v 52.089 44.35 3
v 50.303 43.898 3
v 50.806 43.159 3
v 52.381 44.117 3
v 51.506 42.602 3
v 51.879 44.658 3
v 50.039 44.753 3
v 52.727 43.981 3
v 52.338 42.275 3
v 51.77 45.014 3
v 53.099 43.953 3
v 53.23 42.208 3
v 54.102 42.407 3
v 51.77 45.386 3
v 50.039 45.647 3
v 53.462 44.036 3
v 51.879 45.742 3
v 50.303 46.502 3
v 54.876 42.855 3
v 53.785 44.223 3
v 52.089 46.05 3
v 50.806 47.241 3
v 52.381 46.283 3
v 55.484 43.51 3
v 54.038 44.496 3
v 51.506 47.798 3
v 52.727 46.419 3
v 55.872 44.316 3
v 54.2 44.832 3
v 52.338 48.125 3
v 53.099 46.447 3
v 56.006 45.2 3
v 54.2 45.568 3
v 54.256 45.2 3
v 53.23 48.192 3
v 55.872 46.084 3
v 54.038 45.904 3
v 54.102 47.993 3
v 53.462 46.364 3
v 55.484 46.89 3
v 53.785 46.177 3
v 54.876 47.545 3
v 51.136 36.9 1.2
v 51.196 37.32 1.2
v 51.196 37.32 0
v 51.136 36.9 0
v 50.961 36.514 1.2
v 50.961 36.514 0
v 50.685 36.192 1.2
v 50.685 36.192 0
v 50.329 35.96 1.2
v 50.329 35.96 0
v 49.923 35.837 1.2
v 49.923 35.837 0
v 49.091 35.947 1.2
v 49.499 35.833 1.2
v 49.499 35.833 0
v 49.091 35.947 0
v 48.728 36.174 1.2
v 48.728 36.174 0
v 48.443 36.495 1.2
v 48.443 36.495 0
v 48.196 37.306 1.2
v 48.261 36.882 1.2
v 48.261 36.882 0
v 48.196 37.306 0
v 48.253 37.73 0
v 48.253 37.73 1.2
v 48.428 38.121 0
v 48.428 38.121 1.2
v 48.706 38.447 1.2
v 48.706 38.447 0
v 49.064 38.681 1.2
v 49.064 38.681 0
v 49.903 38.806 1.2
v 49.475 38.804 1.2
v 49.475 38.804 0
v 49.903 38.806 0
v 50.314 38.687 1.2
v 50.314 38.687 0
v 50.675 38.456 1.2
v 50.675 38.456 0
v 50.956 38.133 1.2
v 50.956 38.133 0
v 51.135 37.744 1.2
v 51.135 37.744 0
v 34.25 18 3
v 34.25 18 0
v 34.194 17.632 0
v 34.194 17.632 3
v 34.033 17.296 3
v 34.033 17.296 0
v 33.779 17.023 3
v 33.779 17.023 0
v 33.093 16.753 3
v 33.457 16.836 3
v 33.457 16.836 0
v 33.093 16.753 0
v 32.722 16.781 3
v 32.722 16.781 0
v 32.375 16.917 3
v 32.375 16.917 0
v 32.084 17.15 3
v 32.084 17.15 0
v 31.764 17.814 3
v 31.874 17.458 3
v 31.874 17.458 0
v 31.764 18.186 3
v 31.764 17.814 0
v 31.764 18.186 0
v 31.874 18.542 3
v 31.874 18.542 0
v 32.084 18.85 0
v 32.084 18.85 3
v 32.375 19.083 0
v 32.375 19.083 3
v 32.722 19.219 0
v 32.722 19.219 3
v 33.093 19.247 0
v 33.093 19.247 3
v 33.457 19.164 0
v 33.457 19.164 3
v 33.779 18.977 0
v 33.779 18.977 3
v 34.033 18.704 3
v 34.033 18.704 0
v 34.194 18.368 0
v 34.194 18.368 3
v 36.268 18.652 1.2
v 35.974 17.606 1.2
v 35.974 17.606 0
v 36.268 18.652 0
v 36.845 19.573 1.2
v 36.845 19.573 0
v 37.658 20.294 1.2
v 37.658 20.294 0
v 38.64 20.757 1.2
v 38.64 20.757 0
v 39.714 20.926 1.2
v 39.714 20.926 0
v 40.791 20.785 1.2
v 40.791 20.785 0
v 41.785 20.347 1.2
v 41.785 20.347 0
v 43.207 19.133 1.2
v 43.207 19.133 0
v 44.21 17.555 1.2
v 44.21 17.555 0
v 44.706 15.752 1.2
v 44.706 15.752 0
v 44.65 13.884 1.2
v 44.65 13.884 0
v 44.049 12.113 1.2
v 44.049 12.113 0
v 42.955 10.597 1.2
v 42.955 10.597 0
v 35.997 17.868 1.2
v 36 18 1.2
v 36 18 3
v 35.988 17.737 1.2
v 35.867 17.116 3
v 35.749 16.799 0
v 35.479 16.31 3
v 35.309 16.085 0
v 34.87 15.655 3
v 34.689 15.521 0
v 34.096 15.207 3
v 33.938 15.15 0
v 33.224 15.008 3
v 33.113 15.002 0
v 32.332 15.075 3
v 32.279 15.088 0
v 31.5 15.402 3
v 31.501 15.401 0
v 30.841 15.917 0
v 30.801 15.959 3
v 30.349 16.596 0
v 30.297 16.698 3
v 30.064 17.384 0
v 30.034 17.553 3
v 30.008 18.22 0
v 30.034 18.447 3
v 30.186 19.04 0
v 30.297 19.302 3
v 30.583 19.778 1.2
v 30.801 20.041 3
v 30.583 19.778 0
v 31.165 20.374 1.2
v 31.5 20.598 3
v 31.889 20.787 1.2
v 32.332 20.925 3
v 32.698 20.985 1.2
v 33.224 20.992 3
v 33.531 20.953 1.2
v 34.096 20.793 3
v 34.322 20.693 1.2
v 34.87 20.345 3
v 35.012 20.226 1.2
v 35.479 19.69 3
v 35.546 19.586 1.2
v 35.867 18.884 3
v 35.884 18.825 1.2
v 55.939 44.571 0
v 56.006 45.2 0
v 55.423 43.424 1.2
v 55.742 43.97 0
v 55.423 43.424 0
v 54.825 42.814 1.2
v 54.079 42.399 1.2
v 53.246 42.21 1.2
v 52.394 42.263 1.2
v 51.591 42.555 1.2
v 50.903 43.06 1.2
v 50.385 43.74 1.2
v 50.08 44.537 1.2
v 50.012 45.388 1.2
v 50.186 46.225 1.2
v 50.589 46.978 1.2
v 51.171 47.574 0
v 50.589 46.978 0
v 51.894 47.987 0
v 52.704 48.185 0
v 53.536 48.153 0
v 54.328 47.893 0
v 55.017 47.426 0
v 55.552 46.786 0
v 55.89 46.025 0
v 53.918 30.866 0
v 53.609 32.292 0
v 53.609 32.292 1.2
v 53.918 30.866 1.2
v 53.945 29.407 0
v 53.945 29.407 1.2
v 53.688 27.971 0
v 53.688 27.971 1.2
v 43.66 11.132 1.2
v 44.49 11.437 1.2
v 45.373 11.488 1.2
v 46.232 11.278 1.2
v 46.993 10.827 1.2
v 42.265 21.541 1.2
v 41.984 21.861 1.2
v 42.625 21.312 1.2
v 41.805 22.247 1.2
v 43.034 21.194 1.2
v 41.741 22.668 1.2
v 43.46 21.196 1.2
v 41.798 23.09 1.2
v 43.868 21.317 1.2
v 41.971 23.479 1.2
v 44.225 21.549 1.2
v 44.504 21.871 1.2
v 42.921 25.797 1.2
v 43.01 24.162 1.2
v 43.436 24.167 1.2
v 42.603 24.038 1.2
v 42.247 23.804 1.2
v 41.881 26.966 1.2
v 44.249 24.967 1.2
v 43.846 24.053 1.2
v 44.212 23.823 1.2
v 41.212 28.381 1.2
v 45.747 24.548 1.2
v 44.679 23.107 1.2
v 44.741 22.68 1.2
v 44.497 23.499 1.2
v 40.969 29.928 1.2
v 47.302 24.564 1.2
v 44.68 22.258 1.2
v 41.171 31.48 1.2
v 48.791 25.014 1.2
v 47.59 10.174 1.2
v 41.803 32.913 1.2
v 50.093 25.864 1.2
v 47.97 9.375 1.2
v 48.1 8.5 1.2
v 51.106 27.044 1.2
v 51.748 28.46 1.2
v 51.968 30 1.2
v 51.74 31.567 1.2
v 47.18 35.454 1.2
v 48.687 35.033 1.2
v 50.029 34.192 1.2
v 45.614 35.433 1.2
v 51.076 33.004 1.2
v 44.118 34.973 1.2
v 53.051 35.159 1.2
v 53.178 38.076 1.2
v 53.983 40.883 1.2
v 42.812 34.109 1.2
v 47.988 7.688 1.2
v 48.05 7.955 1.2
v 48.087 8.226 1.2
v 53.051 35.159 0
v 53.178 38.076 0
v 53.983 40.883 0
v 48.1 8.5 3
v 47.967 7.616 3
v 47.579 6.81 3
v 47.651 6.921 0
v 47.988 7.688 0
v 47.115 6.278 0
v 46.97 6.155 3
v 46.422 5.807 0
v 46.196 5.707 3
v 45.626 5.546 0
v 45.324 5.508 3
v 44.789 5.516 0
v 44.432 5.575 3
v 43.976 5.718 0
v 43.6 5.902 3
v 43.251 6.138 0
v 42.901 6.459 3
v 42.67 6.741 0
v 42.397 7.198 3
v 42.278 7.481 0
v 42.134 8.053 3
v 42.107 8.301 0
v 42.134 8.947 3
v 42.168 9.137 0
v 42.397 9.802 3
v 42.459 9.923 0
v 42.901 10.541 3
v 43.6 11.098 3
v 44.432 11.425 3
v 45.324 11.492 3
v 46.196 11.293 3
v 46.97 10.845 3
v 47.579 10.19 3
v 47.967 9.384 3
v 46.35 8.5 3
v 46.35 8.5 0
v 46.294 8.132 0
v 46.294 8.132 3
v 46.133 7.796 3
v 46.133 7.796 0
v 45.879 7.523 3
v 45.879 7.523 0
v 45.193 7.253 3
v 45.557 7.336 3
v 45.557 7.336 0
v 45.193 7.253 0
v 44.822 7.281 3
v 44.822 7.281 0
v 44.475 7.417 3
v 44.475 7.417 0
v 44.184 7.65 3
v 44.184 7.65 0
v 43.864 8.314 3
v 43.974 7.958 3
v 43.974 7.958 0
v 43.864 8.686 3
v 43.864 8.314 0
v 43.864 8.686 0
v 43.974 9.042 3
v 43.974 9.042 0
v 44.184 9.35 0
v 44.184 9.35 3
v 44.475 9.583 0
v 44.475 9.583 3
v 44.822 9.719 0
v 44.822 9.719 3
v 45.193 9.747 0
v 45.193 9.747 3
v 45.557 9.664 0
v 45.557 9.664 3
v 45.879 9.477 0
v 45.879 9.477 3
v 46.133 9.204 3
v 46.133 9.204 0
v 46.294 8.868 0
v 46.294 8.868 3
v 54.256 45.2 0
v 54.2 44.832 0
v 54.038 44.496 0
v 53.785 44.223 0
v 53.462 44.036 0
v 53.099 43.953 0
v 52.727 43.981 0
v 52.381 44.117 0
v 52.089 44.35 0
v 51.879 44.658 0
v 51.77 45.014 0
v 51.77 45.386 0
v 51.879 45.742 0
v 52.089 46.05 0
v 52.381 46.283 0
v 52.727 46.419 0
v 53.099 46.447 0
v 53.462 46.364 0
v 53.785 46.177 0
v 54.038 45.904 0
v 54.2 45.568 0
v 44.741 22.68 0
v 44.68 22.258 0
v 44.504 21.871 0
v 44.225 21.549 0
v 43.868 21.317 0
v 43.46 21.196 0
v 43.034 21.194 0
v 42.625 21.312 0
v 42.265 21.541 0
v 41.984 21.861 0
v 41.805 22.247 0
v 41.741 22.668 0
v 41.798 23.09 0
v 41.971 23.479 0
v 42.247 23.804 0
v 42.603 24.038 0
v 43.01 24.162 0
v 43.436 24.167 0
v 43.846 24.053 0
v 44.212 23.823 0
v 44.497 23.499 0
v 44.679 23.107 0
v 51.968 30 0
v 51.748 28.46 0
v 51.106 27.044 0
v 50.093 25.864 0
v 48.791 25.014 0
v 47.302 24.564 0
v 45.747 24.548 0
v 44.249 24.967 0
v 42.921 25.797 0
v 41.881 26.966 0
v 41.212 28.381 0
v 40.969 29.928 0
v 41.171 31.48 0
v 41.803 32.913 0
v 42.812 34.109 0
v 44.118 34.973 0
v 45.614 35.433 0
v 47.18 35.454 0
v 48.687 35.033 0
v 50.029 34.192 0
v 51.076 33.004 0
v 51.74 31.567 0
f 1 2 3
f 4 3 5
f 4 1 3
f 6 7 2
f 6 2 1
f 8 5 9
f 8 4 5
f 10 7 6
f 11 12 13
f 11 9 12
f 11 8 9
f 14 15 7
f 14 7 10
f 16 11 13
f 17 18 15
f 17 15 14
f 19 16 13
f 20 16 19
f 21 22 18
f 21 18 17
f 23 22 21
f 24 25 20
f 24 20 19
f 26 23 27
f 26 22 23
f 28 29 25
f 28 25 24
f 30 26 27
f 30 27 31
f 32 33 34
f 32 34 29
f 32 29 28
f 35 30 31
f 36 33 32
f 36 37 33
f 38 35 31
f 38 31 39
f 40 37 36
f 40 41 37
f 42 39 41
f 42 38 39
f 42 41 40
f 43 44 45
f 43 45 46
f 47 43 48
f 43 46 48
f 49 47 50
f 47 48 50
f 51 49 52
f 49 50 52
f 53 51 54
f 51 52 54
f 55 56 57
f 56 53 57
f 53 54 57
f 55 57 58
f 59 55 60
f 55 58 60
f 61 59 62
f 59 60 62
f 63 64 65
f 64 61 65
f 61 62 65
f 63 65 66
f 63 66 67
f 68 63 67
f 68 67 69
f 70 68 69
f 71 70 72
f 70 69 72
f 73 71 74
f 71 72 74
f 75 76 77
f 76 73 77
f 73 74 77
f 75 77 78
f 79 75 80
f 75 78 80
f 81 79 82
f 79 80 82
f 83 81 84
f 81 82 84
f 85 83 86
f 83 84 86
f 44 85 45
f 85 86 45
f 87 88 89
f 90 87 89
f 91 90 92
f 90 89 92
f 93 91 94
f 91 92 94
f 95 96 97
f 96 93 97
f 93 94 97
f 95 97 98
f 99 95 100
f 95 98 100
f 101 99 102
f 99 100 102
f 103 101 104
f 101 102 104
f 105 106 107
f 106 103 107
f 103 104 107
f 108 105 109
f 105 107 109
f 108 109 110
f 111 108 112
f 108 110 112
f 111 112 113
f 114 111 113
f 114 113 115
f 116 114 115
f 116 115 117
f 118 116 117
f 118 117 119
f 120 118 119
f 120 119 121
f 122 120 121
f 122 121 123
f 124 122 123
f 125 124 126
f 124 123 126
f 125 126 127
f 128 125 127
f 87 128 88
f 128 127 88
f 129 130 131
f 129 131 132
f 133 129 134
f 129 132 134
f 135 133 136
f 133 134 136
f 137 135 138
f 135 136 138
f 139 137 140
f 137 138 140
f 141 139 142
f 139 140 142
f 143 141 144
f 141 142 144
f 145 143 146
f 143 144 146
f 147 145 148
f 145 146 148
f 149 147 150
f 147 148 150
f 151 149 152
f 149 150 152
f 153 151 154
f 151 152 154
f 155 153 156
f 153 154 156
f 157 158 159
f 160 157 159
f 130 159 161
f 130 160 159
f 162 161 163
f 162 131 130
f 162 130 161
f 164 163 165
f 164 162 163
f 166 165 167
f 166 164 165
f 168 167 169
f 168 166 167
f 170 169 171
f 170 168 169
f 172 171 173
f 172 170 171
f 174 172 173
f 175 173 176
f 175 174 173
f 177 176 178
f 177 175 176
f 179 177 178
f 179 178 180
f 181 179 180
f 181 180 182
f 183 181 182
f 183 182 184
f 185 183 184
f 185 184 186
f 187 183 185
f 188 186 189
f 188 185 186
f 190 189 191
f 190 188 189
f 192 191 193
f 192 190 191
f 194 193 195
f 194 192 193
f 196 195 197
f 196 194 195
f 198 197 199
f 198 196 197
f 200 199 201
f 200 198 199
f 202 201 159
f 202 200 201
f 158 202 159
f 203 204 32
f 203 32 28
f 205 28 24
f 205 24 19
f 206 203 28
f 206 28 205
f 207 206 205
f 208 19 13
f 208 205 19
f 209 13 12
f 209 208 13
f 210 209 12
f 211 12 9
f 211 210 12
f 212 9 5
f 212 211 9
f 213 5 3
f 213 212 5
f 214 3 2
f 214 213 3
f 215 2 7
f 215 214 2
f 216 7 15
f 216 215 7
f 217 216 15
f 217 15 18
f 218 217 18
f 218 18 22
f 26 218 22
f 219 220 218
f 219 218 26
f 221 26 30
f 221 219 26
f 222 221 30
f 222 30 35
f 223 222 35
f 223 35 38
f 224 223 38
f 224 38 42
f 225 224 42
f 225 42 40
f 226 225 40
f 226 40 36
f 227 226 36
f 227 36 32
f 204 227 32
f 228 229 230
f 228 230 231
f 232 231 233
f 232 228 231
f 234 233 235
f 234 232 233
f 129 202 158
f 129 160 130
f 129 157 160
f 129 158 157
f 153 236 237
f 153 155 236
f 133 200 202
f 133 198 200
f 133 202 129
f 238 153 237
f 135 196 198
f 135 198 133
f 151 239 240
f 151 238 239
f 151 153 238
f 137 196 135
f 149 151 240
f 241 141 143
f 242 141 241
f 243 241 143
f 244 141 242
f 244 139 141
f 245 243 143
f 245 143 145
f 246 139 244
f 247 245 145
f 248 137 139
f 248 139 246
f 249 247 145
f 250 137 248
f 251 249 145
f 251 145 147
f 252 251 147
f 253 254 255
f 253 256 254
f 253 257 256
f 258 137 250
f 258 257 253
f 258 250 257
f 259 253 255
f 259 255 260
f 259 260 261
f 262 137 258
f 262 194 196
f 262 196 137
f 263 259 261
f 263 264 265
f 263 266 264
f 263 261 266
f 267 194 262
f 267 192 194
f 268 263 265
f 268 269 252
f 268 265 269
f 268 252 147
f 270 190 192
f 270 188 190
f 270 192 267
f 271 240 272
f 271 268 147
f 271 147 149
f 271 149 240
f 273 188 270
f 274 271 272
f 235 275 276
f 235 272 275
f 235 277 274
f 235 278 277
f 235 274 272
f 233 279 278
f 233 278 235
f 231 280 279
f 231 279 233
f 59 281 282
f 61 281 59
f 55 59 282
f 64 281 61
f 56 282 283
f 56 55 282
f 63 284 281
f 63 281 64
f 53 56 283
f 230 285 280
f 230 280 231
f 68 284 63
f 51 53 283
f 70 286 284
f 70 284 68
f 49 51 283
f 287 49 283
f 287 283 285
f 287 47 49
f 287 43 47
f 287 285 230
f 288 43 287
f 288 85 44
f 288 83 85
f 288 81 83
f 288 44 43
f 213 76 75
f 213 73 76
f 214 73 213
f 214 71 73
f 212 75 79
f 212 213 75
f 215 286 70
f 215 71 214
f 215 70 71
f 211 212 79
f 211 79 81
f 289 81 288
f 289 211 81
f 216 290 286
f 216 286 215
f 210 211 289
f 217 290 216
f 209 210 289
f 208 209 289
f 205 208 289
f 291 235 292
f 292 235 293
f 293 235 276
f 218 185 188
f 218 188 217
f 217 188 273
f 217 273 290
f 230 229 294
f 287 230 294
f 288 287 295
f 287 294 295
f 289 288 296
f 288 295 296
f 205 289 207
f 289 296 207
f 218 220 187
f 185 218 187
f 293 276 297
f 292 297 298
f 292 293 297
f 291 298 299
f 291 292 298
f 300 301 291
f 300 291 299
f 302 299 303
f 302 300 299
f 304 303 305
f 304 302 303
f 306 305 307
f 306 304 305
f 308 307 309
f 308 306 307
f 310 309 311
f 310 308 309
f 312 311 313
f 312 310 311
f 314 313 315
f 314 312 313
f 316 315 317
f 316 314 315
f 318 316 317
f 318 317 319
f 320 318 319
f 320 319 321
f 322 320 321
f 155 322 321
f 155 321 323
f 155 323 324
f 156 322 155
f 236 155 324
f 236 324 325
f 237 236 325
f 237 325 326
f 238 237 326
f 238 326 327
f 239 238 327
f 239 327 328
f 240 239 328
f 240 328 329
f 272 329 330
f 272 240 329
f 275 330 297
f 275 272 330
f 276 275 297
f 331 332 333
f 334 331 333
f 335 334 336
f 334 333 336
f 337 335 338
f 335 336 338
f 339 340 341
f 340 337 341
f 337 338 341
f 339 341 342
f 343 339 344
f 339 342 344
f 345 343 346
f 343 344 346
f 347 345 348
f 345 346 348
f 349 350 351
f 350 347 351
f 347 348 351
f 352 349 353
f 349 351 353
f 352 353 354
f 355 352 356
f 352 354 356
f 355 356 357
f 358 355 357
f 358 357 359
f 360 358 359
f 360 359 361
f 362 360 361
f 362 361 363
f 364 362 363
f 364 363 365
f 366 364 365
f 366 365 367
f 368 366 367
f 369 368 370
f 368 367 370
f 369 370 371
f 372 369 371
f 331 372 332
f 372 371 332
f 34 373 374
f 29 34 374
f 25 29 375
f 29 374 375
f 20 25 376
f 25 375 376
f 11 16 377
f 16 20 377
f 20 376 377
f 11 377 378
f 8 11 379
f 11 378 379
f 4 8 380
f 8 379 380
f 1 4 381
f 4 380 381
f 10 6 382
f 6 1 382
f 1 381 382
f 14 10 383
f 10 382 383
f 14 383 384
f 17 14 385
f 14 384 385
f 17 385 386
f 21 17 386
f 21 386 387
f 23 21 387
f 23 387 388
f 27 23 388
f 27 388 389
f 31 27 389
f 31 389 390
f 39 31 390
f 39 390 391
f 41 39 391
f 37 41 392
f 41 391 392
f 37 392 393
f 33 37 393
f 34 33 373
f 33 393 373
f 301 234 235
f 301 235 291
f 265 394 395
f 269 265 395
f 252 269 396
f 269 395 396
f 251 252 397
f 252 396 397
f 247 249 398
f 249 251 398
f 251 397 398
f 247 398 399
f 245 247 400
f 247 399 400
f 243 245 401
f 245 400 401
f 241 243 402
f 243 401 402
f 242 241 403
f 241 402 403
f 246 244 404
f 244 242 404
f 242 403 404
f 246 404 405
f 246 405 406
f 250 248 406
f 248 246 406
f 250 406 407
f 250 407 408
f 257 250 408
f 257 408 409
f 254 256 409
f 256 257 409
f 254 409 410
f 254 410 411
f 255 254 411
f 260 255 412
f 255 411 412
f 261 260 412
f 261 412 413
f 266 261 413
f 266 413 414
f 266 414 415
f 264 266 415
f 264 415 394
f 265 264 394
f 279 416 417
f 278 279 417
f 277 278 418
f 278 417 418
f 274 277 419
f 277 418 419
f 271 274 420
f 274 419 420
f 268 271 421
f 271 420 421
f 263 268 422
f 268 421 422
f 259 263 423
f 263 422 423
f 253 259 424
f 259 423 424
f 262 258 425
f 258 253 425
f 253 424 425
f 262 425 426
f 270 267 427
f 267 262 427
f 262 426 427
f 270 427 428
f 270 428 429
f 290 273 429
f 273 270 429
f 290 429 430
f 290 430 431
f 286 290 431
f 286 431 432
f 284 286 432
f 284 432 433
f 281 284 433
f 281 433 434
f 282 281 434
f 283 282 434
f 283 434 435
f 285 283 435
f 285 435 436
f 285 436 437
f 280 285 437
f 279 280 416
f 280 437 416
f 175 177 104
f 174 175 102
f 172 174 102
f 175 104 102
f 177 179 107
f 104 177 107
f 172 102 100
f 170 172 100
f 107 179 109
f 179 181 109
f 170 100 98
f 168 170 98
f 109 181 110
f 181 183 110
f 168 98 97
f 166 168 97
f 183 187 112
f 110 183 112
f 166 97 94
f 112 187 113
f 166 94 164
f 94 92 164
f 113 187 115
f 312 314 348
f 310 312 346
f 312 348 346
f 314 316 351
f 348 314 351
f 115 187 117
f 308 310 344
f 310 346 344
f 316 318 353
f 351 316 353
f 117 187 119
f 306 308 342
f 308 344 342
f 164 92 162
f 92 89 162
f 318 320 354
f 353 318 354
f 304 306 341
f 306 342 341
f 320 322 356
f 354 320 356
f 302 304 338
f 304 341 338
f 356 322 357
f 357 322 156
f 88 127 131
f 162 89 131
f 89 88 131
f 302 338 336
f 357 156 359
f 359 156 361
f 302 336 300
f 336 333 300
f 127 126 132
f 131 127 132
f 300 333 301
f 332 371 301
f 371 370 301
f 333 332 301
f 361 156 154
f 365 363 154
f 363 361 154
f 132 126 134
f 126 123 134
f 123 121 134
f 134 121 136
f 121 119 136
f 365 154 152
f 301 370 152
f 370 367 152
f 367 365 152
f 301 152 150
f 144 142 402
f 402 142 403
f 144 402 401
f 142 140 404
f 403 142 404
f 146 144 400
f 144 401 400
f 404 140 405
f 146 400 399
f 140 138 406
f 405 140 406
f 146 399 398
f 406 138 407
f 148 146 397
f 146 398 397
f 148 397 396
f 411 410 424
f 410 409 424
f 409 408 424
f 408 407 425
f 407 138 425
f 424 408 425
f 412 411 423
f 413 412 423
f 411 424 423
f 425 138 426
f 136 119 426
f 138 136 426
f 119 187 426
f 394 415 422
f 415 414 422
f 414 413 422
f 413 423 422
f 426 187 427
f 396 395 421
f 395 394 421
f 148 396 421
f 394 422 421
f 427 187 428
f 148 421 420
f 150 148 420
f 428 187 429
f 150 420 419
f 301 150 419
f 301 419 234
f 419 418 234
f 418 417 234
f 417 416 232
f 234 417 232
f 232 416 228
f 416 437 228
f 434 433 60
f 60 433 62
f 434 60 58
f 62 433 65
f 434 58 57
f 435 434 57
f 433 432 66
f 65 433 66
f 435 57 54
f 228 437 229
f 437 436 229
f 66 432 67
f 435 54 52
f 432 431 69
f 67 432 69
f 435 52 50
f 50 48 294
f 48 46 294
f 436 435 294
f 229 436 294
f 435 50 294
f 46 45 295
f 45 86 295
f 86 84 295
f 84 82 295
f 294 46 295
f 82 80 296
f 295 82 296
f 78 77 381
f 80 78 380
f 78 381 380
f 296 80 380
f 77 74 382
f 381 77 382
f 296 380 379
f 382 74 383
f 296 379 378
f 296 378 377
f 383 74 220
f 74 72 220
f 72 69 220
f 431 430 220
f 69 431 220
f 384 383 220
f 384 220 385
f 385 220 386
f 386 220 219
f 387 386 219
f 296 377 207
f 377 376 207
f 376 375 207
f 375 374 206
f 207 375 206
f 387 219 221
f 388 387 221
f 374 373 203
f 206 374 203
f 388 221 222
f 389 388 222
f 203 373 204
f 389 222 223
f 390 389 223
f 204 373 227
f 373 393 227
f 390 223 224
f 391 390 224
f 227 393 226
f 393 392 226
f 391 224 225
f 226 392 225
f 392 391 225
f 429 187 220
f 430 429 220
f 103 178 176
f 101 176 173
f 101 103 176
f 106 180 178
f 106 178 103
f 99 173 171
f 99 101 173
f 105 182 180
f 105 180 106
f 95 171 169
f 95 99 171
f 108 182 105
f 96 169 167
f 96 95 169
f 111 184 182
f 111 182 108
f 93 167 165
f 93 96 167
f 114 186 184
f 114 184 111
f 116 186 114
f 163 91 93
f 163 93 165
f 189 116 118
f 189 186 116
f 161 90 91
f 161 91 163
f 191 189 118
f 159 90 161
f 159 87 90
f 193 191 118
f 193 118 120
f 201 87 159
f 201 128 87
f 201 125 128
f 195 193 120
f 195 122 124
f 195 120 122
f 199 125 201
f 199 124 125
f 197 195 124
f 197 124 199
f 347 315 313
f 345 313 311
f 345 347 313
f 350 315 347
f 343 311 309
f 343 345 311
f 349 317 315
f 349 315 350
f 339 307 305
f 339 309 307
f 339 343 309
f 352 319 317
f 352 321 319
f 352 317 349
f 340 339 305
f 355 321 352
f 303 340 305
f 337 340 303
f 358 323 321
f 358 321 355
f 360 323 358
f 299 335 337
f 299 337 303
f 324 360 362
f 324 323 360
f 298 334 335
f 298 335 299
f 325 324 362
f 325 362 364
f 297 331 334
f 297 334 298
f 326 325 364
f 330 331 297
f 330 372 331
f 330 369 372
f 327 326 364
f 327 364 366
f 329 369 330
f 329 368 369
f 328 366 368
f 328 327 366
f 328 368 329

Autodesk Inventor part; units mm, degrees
ref_plane "YZ Plane" through (0, 0, 0) normal (1, 0, 0) x (0, 1, 0)
ref_plane "XZ Plane" through (0, 0, 0) normal (0, 1, 0) x (-1, 0, 0)
ref_plane "XY Plane" through (0, 0, 0) normal (0, 0, 1) x (1, 0, 0)
sketch "Sketch1" plane through (0, 0, 0) normal (0, 0, 1) x (1, 0, 0)
  circle A0 centre (46.4683, 30) radius 5.5
  arc A1 (72.1609, 38.7902) -> (45.5671, 45.0103) centre (50.3015, 5.2915) ccw construction
  arc A2 (76.7854, 39.1678) -> (44.5539, 47.9057) centre (50.3015, 5.2915) ccw
  circle A3 centre (53.0056, 45.2) radius 1.25
  circle A4 centre (45.1, 8.5) radius 1.25
  circle A5 centre (49.6959, 37.32) radius 1.5
  line L0 (49.6959, 37.32) -> (46.4683, 30)
  line L1 (46.4683, 30) -> (43.2407, 22.68)
  circle A6 centre (43.2407, 22.68) radius 2.75 construction
  circle A7 centre (33, 18) radius 1.25
  arc A8 (53.6885, 27.9707) -> (53.6094, 32.2922) centre (46.4683, 30) ccw
  circle A9 centre (43.2407, 22.68) radius 1.5
  line L2 (49.6959, 37.32) -> (52.6411, 36.7492) construction
  circle A10 centre (53.0056, 45.2) radius 3
  circle A11 centre (33, 18) radius 3
  circle A12 centre (45.1, 8.5) radius 3
  arc A13 (55.4232, 43.4237) -> (53.6094, 32.2922) centre (65.4161, 36.0819) ccw
  arc A14 (42.955, 10.5973) -> (41.785, 20.3468) centre (38.4504, 15.0017) ccw
  arc A15 (41.785, 20.3468) -> (35.974, 17.6062) centre (39.7624, 17.1047) ccw
  line L3 (53.6885, 27.9707) -> (47.9881, 7.6883)
  line L4 (50.5889, 46.9775) -> (30.5833, 19.7775)
  point P0 (0, 0)
  dimension "d29" = 5.5
  dimension "d24" = 11
  dimension "d25" = 3
  dimension "d26" = 3
  dimension "d27" = 8
  dimension "d28" = 8
  dimension "d30" = 22.68
  dimension "d31" = 2
  dimension "d32" = 3
  dimension "d33" = 3
  dimension "d34" = 6
  dimension "d35" = 6
  dimension "d36" = 6
  dimension "d37" = 6.3
  dimension "d39" = 12.4
extrude "Extrusion1" add sketch "Sketch1" along normal blind 3 contours A12 | A10 | A11
extrude "Extrusion4" add sketch "Sketch1" along normal blind 1.2 contours L3 A12 A14 A15 A11 L4 A10 A13 A8
properties part number "モータマウント" material "Aluminum 2014-T4"
